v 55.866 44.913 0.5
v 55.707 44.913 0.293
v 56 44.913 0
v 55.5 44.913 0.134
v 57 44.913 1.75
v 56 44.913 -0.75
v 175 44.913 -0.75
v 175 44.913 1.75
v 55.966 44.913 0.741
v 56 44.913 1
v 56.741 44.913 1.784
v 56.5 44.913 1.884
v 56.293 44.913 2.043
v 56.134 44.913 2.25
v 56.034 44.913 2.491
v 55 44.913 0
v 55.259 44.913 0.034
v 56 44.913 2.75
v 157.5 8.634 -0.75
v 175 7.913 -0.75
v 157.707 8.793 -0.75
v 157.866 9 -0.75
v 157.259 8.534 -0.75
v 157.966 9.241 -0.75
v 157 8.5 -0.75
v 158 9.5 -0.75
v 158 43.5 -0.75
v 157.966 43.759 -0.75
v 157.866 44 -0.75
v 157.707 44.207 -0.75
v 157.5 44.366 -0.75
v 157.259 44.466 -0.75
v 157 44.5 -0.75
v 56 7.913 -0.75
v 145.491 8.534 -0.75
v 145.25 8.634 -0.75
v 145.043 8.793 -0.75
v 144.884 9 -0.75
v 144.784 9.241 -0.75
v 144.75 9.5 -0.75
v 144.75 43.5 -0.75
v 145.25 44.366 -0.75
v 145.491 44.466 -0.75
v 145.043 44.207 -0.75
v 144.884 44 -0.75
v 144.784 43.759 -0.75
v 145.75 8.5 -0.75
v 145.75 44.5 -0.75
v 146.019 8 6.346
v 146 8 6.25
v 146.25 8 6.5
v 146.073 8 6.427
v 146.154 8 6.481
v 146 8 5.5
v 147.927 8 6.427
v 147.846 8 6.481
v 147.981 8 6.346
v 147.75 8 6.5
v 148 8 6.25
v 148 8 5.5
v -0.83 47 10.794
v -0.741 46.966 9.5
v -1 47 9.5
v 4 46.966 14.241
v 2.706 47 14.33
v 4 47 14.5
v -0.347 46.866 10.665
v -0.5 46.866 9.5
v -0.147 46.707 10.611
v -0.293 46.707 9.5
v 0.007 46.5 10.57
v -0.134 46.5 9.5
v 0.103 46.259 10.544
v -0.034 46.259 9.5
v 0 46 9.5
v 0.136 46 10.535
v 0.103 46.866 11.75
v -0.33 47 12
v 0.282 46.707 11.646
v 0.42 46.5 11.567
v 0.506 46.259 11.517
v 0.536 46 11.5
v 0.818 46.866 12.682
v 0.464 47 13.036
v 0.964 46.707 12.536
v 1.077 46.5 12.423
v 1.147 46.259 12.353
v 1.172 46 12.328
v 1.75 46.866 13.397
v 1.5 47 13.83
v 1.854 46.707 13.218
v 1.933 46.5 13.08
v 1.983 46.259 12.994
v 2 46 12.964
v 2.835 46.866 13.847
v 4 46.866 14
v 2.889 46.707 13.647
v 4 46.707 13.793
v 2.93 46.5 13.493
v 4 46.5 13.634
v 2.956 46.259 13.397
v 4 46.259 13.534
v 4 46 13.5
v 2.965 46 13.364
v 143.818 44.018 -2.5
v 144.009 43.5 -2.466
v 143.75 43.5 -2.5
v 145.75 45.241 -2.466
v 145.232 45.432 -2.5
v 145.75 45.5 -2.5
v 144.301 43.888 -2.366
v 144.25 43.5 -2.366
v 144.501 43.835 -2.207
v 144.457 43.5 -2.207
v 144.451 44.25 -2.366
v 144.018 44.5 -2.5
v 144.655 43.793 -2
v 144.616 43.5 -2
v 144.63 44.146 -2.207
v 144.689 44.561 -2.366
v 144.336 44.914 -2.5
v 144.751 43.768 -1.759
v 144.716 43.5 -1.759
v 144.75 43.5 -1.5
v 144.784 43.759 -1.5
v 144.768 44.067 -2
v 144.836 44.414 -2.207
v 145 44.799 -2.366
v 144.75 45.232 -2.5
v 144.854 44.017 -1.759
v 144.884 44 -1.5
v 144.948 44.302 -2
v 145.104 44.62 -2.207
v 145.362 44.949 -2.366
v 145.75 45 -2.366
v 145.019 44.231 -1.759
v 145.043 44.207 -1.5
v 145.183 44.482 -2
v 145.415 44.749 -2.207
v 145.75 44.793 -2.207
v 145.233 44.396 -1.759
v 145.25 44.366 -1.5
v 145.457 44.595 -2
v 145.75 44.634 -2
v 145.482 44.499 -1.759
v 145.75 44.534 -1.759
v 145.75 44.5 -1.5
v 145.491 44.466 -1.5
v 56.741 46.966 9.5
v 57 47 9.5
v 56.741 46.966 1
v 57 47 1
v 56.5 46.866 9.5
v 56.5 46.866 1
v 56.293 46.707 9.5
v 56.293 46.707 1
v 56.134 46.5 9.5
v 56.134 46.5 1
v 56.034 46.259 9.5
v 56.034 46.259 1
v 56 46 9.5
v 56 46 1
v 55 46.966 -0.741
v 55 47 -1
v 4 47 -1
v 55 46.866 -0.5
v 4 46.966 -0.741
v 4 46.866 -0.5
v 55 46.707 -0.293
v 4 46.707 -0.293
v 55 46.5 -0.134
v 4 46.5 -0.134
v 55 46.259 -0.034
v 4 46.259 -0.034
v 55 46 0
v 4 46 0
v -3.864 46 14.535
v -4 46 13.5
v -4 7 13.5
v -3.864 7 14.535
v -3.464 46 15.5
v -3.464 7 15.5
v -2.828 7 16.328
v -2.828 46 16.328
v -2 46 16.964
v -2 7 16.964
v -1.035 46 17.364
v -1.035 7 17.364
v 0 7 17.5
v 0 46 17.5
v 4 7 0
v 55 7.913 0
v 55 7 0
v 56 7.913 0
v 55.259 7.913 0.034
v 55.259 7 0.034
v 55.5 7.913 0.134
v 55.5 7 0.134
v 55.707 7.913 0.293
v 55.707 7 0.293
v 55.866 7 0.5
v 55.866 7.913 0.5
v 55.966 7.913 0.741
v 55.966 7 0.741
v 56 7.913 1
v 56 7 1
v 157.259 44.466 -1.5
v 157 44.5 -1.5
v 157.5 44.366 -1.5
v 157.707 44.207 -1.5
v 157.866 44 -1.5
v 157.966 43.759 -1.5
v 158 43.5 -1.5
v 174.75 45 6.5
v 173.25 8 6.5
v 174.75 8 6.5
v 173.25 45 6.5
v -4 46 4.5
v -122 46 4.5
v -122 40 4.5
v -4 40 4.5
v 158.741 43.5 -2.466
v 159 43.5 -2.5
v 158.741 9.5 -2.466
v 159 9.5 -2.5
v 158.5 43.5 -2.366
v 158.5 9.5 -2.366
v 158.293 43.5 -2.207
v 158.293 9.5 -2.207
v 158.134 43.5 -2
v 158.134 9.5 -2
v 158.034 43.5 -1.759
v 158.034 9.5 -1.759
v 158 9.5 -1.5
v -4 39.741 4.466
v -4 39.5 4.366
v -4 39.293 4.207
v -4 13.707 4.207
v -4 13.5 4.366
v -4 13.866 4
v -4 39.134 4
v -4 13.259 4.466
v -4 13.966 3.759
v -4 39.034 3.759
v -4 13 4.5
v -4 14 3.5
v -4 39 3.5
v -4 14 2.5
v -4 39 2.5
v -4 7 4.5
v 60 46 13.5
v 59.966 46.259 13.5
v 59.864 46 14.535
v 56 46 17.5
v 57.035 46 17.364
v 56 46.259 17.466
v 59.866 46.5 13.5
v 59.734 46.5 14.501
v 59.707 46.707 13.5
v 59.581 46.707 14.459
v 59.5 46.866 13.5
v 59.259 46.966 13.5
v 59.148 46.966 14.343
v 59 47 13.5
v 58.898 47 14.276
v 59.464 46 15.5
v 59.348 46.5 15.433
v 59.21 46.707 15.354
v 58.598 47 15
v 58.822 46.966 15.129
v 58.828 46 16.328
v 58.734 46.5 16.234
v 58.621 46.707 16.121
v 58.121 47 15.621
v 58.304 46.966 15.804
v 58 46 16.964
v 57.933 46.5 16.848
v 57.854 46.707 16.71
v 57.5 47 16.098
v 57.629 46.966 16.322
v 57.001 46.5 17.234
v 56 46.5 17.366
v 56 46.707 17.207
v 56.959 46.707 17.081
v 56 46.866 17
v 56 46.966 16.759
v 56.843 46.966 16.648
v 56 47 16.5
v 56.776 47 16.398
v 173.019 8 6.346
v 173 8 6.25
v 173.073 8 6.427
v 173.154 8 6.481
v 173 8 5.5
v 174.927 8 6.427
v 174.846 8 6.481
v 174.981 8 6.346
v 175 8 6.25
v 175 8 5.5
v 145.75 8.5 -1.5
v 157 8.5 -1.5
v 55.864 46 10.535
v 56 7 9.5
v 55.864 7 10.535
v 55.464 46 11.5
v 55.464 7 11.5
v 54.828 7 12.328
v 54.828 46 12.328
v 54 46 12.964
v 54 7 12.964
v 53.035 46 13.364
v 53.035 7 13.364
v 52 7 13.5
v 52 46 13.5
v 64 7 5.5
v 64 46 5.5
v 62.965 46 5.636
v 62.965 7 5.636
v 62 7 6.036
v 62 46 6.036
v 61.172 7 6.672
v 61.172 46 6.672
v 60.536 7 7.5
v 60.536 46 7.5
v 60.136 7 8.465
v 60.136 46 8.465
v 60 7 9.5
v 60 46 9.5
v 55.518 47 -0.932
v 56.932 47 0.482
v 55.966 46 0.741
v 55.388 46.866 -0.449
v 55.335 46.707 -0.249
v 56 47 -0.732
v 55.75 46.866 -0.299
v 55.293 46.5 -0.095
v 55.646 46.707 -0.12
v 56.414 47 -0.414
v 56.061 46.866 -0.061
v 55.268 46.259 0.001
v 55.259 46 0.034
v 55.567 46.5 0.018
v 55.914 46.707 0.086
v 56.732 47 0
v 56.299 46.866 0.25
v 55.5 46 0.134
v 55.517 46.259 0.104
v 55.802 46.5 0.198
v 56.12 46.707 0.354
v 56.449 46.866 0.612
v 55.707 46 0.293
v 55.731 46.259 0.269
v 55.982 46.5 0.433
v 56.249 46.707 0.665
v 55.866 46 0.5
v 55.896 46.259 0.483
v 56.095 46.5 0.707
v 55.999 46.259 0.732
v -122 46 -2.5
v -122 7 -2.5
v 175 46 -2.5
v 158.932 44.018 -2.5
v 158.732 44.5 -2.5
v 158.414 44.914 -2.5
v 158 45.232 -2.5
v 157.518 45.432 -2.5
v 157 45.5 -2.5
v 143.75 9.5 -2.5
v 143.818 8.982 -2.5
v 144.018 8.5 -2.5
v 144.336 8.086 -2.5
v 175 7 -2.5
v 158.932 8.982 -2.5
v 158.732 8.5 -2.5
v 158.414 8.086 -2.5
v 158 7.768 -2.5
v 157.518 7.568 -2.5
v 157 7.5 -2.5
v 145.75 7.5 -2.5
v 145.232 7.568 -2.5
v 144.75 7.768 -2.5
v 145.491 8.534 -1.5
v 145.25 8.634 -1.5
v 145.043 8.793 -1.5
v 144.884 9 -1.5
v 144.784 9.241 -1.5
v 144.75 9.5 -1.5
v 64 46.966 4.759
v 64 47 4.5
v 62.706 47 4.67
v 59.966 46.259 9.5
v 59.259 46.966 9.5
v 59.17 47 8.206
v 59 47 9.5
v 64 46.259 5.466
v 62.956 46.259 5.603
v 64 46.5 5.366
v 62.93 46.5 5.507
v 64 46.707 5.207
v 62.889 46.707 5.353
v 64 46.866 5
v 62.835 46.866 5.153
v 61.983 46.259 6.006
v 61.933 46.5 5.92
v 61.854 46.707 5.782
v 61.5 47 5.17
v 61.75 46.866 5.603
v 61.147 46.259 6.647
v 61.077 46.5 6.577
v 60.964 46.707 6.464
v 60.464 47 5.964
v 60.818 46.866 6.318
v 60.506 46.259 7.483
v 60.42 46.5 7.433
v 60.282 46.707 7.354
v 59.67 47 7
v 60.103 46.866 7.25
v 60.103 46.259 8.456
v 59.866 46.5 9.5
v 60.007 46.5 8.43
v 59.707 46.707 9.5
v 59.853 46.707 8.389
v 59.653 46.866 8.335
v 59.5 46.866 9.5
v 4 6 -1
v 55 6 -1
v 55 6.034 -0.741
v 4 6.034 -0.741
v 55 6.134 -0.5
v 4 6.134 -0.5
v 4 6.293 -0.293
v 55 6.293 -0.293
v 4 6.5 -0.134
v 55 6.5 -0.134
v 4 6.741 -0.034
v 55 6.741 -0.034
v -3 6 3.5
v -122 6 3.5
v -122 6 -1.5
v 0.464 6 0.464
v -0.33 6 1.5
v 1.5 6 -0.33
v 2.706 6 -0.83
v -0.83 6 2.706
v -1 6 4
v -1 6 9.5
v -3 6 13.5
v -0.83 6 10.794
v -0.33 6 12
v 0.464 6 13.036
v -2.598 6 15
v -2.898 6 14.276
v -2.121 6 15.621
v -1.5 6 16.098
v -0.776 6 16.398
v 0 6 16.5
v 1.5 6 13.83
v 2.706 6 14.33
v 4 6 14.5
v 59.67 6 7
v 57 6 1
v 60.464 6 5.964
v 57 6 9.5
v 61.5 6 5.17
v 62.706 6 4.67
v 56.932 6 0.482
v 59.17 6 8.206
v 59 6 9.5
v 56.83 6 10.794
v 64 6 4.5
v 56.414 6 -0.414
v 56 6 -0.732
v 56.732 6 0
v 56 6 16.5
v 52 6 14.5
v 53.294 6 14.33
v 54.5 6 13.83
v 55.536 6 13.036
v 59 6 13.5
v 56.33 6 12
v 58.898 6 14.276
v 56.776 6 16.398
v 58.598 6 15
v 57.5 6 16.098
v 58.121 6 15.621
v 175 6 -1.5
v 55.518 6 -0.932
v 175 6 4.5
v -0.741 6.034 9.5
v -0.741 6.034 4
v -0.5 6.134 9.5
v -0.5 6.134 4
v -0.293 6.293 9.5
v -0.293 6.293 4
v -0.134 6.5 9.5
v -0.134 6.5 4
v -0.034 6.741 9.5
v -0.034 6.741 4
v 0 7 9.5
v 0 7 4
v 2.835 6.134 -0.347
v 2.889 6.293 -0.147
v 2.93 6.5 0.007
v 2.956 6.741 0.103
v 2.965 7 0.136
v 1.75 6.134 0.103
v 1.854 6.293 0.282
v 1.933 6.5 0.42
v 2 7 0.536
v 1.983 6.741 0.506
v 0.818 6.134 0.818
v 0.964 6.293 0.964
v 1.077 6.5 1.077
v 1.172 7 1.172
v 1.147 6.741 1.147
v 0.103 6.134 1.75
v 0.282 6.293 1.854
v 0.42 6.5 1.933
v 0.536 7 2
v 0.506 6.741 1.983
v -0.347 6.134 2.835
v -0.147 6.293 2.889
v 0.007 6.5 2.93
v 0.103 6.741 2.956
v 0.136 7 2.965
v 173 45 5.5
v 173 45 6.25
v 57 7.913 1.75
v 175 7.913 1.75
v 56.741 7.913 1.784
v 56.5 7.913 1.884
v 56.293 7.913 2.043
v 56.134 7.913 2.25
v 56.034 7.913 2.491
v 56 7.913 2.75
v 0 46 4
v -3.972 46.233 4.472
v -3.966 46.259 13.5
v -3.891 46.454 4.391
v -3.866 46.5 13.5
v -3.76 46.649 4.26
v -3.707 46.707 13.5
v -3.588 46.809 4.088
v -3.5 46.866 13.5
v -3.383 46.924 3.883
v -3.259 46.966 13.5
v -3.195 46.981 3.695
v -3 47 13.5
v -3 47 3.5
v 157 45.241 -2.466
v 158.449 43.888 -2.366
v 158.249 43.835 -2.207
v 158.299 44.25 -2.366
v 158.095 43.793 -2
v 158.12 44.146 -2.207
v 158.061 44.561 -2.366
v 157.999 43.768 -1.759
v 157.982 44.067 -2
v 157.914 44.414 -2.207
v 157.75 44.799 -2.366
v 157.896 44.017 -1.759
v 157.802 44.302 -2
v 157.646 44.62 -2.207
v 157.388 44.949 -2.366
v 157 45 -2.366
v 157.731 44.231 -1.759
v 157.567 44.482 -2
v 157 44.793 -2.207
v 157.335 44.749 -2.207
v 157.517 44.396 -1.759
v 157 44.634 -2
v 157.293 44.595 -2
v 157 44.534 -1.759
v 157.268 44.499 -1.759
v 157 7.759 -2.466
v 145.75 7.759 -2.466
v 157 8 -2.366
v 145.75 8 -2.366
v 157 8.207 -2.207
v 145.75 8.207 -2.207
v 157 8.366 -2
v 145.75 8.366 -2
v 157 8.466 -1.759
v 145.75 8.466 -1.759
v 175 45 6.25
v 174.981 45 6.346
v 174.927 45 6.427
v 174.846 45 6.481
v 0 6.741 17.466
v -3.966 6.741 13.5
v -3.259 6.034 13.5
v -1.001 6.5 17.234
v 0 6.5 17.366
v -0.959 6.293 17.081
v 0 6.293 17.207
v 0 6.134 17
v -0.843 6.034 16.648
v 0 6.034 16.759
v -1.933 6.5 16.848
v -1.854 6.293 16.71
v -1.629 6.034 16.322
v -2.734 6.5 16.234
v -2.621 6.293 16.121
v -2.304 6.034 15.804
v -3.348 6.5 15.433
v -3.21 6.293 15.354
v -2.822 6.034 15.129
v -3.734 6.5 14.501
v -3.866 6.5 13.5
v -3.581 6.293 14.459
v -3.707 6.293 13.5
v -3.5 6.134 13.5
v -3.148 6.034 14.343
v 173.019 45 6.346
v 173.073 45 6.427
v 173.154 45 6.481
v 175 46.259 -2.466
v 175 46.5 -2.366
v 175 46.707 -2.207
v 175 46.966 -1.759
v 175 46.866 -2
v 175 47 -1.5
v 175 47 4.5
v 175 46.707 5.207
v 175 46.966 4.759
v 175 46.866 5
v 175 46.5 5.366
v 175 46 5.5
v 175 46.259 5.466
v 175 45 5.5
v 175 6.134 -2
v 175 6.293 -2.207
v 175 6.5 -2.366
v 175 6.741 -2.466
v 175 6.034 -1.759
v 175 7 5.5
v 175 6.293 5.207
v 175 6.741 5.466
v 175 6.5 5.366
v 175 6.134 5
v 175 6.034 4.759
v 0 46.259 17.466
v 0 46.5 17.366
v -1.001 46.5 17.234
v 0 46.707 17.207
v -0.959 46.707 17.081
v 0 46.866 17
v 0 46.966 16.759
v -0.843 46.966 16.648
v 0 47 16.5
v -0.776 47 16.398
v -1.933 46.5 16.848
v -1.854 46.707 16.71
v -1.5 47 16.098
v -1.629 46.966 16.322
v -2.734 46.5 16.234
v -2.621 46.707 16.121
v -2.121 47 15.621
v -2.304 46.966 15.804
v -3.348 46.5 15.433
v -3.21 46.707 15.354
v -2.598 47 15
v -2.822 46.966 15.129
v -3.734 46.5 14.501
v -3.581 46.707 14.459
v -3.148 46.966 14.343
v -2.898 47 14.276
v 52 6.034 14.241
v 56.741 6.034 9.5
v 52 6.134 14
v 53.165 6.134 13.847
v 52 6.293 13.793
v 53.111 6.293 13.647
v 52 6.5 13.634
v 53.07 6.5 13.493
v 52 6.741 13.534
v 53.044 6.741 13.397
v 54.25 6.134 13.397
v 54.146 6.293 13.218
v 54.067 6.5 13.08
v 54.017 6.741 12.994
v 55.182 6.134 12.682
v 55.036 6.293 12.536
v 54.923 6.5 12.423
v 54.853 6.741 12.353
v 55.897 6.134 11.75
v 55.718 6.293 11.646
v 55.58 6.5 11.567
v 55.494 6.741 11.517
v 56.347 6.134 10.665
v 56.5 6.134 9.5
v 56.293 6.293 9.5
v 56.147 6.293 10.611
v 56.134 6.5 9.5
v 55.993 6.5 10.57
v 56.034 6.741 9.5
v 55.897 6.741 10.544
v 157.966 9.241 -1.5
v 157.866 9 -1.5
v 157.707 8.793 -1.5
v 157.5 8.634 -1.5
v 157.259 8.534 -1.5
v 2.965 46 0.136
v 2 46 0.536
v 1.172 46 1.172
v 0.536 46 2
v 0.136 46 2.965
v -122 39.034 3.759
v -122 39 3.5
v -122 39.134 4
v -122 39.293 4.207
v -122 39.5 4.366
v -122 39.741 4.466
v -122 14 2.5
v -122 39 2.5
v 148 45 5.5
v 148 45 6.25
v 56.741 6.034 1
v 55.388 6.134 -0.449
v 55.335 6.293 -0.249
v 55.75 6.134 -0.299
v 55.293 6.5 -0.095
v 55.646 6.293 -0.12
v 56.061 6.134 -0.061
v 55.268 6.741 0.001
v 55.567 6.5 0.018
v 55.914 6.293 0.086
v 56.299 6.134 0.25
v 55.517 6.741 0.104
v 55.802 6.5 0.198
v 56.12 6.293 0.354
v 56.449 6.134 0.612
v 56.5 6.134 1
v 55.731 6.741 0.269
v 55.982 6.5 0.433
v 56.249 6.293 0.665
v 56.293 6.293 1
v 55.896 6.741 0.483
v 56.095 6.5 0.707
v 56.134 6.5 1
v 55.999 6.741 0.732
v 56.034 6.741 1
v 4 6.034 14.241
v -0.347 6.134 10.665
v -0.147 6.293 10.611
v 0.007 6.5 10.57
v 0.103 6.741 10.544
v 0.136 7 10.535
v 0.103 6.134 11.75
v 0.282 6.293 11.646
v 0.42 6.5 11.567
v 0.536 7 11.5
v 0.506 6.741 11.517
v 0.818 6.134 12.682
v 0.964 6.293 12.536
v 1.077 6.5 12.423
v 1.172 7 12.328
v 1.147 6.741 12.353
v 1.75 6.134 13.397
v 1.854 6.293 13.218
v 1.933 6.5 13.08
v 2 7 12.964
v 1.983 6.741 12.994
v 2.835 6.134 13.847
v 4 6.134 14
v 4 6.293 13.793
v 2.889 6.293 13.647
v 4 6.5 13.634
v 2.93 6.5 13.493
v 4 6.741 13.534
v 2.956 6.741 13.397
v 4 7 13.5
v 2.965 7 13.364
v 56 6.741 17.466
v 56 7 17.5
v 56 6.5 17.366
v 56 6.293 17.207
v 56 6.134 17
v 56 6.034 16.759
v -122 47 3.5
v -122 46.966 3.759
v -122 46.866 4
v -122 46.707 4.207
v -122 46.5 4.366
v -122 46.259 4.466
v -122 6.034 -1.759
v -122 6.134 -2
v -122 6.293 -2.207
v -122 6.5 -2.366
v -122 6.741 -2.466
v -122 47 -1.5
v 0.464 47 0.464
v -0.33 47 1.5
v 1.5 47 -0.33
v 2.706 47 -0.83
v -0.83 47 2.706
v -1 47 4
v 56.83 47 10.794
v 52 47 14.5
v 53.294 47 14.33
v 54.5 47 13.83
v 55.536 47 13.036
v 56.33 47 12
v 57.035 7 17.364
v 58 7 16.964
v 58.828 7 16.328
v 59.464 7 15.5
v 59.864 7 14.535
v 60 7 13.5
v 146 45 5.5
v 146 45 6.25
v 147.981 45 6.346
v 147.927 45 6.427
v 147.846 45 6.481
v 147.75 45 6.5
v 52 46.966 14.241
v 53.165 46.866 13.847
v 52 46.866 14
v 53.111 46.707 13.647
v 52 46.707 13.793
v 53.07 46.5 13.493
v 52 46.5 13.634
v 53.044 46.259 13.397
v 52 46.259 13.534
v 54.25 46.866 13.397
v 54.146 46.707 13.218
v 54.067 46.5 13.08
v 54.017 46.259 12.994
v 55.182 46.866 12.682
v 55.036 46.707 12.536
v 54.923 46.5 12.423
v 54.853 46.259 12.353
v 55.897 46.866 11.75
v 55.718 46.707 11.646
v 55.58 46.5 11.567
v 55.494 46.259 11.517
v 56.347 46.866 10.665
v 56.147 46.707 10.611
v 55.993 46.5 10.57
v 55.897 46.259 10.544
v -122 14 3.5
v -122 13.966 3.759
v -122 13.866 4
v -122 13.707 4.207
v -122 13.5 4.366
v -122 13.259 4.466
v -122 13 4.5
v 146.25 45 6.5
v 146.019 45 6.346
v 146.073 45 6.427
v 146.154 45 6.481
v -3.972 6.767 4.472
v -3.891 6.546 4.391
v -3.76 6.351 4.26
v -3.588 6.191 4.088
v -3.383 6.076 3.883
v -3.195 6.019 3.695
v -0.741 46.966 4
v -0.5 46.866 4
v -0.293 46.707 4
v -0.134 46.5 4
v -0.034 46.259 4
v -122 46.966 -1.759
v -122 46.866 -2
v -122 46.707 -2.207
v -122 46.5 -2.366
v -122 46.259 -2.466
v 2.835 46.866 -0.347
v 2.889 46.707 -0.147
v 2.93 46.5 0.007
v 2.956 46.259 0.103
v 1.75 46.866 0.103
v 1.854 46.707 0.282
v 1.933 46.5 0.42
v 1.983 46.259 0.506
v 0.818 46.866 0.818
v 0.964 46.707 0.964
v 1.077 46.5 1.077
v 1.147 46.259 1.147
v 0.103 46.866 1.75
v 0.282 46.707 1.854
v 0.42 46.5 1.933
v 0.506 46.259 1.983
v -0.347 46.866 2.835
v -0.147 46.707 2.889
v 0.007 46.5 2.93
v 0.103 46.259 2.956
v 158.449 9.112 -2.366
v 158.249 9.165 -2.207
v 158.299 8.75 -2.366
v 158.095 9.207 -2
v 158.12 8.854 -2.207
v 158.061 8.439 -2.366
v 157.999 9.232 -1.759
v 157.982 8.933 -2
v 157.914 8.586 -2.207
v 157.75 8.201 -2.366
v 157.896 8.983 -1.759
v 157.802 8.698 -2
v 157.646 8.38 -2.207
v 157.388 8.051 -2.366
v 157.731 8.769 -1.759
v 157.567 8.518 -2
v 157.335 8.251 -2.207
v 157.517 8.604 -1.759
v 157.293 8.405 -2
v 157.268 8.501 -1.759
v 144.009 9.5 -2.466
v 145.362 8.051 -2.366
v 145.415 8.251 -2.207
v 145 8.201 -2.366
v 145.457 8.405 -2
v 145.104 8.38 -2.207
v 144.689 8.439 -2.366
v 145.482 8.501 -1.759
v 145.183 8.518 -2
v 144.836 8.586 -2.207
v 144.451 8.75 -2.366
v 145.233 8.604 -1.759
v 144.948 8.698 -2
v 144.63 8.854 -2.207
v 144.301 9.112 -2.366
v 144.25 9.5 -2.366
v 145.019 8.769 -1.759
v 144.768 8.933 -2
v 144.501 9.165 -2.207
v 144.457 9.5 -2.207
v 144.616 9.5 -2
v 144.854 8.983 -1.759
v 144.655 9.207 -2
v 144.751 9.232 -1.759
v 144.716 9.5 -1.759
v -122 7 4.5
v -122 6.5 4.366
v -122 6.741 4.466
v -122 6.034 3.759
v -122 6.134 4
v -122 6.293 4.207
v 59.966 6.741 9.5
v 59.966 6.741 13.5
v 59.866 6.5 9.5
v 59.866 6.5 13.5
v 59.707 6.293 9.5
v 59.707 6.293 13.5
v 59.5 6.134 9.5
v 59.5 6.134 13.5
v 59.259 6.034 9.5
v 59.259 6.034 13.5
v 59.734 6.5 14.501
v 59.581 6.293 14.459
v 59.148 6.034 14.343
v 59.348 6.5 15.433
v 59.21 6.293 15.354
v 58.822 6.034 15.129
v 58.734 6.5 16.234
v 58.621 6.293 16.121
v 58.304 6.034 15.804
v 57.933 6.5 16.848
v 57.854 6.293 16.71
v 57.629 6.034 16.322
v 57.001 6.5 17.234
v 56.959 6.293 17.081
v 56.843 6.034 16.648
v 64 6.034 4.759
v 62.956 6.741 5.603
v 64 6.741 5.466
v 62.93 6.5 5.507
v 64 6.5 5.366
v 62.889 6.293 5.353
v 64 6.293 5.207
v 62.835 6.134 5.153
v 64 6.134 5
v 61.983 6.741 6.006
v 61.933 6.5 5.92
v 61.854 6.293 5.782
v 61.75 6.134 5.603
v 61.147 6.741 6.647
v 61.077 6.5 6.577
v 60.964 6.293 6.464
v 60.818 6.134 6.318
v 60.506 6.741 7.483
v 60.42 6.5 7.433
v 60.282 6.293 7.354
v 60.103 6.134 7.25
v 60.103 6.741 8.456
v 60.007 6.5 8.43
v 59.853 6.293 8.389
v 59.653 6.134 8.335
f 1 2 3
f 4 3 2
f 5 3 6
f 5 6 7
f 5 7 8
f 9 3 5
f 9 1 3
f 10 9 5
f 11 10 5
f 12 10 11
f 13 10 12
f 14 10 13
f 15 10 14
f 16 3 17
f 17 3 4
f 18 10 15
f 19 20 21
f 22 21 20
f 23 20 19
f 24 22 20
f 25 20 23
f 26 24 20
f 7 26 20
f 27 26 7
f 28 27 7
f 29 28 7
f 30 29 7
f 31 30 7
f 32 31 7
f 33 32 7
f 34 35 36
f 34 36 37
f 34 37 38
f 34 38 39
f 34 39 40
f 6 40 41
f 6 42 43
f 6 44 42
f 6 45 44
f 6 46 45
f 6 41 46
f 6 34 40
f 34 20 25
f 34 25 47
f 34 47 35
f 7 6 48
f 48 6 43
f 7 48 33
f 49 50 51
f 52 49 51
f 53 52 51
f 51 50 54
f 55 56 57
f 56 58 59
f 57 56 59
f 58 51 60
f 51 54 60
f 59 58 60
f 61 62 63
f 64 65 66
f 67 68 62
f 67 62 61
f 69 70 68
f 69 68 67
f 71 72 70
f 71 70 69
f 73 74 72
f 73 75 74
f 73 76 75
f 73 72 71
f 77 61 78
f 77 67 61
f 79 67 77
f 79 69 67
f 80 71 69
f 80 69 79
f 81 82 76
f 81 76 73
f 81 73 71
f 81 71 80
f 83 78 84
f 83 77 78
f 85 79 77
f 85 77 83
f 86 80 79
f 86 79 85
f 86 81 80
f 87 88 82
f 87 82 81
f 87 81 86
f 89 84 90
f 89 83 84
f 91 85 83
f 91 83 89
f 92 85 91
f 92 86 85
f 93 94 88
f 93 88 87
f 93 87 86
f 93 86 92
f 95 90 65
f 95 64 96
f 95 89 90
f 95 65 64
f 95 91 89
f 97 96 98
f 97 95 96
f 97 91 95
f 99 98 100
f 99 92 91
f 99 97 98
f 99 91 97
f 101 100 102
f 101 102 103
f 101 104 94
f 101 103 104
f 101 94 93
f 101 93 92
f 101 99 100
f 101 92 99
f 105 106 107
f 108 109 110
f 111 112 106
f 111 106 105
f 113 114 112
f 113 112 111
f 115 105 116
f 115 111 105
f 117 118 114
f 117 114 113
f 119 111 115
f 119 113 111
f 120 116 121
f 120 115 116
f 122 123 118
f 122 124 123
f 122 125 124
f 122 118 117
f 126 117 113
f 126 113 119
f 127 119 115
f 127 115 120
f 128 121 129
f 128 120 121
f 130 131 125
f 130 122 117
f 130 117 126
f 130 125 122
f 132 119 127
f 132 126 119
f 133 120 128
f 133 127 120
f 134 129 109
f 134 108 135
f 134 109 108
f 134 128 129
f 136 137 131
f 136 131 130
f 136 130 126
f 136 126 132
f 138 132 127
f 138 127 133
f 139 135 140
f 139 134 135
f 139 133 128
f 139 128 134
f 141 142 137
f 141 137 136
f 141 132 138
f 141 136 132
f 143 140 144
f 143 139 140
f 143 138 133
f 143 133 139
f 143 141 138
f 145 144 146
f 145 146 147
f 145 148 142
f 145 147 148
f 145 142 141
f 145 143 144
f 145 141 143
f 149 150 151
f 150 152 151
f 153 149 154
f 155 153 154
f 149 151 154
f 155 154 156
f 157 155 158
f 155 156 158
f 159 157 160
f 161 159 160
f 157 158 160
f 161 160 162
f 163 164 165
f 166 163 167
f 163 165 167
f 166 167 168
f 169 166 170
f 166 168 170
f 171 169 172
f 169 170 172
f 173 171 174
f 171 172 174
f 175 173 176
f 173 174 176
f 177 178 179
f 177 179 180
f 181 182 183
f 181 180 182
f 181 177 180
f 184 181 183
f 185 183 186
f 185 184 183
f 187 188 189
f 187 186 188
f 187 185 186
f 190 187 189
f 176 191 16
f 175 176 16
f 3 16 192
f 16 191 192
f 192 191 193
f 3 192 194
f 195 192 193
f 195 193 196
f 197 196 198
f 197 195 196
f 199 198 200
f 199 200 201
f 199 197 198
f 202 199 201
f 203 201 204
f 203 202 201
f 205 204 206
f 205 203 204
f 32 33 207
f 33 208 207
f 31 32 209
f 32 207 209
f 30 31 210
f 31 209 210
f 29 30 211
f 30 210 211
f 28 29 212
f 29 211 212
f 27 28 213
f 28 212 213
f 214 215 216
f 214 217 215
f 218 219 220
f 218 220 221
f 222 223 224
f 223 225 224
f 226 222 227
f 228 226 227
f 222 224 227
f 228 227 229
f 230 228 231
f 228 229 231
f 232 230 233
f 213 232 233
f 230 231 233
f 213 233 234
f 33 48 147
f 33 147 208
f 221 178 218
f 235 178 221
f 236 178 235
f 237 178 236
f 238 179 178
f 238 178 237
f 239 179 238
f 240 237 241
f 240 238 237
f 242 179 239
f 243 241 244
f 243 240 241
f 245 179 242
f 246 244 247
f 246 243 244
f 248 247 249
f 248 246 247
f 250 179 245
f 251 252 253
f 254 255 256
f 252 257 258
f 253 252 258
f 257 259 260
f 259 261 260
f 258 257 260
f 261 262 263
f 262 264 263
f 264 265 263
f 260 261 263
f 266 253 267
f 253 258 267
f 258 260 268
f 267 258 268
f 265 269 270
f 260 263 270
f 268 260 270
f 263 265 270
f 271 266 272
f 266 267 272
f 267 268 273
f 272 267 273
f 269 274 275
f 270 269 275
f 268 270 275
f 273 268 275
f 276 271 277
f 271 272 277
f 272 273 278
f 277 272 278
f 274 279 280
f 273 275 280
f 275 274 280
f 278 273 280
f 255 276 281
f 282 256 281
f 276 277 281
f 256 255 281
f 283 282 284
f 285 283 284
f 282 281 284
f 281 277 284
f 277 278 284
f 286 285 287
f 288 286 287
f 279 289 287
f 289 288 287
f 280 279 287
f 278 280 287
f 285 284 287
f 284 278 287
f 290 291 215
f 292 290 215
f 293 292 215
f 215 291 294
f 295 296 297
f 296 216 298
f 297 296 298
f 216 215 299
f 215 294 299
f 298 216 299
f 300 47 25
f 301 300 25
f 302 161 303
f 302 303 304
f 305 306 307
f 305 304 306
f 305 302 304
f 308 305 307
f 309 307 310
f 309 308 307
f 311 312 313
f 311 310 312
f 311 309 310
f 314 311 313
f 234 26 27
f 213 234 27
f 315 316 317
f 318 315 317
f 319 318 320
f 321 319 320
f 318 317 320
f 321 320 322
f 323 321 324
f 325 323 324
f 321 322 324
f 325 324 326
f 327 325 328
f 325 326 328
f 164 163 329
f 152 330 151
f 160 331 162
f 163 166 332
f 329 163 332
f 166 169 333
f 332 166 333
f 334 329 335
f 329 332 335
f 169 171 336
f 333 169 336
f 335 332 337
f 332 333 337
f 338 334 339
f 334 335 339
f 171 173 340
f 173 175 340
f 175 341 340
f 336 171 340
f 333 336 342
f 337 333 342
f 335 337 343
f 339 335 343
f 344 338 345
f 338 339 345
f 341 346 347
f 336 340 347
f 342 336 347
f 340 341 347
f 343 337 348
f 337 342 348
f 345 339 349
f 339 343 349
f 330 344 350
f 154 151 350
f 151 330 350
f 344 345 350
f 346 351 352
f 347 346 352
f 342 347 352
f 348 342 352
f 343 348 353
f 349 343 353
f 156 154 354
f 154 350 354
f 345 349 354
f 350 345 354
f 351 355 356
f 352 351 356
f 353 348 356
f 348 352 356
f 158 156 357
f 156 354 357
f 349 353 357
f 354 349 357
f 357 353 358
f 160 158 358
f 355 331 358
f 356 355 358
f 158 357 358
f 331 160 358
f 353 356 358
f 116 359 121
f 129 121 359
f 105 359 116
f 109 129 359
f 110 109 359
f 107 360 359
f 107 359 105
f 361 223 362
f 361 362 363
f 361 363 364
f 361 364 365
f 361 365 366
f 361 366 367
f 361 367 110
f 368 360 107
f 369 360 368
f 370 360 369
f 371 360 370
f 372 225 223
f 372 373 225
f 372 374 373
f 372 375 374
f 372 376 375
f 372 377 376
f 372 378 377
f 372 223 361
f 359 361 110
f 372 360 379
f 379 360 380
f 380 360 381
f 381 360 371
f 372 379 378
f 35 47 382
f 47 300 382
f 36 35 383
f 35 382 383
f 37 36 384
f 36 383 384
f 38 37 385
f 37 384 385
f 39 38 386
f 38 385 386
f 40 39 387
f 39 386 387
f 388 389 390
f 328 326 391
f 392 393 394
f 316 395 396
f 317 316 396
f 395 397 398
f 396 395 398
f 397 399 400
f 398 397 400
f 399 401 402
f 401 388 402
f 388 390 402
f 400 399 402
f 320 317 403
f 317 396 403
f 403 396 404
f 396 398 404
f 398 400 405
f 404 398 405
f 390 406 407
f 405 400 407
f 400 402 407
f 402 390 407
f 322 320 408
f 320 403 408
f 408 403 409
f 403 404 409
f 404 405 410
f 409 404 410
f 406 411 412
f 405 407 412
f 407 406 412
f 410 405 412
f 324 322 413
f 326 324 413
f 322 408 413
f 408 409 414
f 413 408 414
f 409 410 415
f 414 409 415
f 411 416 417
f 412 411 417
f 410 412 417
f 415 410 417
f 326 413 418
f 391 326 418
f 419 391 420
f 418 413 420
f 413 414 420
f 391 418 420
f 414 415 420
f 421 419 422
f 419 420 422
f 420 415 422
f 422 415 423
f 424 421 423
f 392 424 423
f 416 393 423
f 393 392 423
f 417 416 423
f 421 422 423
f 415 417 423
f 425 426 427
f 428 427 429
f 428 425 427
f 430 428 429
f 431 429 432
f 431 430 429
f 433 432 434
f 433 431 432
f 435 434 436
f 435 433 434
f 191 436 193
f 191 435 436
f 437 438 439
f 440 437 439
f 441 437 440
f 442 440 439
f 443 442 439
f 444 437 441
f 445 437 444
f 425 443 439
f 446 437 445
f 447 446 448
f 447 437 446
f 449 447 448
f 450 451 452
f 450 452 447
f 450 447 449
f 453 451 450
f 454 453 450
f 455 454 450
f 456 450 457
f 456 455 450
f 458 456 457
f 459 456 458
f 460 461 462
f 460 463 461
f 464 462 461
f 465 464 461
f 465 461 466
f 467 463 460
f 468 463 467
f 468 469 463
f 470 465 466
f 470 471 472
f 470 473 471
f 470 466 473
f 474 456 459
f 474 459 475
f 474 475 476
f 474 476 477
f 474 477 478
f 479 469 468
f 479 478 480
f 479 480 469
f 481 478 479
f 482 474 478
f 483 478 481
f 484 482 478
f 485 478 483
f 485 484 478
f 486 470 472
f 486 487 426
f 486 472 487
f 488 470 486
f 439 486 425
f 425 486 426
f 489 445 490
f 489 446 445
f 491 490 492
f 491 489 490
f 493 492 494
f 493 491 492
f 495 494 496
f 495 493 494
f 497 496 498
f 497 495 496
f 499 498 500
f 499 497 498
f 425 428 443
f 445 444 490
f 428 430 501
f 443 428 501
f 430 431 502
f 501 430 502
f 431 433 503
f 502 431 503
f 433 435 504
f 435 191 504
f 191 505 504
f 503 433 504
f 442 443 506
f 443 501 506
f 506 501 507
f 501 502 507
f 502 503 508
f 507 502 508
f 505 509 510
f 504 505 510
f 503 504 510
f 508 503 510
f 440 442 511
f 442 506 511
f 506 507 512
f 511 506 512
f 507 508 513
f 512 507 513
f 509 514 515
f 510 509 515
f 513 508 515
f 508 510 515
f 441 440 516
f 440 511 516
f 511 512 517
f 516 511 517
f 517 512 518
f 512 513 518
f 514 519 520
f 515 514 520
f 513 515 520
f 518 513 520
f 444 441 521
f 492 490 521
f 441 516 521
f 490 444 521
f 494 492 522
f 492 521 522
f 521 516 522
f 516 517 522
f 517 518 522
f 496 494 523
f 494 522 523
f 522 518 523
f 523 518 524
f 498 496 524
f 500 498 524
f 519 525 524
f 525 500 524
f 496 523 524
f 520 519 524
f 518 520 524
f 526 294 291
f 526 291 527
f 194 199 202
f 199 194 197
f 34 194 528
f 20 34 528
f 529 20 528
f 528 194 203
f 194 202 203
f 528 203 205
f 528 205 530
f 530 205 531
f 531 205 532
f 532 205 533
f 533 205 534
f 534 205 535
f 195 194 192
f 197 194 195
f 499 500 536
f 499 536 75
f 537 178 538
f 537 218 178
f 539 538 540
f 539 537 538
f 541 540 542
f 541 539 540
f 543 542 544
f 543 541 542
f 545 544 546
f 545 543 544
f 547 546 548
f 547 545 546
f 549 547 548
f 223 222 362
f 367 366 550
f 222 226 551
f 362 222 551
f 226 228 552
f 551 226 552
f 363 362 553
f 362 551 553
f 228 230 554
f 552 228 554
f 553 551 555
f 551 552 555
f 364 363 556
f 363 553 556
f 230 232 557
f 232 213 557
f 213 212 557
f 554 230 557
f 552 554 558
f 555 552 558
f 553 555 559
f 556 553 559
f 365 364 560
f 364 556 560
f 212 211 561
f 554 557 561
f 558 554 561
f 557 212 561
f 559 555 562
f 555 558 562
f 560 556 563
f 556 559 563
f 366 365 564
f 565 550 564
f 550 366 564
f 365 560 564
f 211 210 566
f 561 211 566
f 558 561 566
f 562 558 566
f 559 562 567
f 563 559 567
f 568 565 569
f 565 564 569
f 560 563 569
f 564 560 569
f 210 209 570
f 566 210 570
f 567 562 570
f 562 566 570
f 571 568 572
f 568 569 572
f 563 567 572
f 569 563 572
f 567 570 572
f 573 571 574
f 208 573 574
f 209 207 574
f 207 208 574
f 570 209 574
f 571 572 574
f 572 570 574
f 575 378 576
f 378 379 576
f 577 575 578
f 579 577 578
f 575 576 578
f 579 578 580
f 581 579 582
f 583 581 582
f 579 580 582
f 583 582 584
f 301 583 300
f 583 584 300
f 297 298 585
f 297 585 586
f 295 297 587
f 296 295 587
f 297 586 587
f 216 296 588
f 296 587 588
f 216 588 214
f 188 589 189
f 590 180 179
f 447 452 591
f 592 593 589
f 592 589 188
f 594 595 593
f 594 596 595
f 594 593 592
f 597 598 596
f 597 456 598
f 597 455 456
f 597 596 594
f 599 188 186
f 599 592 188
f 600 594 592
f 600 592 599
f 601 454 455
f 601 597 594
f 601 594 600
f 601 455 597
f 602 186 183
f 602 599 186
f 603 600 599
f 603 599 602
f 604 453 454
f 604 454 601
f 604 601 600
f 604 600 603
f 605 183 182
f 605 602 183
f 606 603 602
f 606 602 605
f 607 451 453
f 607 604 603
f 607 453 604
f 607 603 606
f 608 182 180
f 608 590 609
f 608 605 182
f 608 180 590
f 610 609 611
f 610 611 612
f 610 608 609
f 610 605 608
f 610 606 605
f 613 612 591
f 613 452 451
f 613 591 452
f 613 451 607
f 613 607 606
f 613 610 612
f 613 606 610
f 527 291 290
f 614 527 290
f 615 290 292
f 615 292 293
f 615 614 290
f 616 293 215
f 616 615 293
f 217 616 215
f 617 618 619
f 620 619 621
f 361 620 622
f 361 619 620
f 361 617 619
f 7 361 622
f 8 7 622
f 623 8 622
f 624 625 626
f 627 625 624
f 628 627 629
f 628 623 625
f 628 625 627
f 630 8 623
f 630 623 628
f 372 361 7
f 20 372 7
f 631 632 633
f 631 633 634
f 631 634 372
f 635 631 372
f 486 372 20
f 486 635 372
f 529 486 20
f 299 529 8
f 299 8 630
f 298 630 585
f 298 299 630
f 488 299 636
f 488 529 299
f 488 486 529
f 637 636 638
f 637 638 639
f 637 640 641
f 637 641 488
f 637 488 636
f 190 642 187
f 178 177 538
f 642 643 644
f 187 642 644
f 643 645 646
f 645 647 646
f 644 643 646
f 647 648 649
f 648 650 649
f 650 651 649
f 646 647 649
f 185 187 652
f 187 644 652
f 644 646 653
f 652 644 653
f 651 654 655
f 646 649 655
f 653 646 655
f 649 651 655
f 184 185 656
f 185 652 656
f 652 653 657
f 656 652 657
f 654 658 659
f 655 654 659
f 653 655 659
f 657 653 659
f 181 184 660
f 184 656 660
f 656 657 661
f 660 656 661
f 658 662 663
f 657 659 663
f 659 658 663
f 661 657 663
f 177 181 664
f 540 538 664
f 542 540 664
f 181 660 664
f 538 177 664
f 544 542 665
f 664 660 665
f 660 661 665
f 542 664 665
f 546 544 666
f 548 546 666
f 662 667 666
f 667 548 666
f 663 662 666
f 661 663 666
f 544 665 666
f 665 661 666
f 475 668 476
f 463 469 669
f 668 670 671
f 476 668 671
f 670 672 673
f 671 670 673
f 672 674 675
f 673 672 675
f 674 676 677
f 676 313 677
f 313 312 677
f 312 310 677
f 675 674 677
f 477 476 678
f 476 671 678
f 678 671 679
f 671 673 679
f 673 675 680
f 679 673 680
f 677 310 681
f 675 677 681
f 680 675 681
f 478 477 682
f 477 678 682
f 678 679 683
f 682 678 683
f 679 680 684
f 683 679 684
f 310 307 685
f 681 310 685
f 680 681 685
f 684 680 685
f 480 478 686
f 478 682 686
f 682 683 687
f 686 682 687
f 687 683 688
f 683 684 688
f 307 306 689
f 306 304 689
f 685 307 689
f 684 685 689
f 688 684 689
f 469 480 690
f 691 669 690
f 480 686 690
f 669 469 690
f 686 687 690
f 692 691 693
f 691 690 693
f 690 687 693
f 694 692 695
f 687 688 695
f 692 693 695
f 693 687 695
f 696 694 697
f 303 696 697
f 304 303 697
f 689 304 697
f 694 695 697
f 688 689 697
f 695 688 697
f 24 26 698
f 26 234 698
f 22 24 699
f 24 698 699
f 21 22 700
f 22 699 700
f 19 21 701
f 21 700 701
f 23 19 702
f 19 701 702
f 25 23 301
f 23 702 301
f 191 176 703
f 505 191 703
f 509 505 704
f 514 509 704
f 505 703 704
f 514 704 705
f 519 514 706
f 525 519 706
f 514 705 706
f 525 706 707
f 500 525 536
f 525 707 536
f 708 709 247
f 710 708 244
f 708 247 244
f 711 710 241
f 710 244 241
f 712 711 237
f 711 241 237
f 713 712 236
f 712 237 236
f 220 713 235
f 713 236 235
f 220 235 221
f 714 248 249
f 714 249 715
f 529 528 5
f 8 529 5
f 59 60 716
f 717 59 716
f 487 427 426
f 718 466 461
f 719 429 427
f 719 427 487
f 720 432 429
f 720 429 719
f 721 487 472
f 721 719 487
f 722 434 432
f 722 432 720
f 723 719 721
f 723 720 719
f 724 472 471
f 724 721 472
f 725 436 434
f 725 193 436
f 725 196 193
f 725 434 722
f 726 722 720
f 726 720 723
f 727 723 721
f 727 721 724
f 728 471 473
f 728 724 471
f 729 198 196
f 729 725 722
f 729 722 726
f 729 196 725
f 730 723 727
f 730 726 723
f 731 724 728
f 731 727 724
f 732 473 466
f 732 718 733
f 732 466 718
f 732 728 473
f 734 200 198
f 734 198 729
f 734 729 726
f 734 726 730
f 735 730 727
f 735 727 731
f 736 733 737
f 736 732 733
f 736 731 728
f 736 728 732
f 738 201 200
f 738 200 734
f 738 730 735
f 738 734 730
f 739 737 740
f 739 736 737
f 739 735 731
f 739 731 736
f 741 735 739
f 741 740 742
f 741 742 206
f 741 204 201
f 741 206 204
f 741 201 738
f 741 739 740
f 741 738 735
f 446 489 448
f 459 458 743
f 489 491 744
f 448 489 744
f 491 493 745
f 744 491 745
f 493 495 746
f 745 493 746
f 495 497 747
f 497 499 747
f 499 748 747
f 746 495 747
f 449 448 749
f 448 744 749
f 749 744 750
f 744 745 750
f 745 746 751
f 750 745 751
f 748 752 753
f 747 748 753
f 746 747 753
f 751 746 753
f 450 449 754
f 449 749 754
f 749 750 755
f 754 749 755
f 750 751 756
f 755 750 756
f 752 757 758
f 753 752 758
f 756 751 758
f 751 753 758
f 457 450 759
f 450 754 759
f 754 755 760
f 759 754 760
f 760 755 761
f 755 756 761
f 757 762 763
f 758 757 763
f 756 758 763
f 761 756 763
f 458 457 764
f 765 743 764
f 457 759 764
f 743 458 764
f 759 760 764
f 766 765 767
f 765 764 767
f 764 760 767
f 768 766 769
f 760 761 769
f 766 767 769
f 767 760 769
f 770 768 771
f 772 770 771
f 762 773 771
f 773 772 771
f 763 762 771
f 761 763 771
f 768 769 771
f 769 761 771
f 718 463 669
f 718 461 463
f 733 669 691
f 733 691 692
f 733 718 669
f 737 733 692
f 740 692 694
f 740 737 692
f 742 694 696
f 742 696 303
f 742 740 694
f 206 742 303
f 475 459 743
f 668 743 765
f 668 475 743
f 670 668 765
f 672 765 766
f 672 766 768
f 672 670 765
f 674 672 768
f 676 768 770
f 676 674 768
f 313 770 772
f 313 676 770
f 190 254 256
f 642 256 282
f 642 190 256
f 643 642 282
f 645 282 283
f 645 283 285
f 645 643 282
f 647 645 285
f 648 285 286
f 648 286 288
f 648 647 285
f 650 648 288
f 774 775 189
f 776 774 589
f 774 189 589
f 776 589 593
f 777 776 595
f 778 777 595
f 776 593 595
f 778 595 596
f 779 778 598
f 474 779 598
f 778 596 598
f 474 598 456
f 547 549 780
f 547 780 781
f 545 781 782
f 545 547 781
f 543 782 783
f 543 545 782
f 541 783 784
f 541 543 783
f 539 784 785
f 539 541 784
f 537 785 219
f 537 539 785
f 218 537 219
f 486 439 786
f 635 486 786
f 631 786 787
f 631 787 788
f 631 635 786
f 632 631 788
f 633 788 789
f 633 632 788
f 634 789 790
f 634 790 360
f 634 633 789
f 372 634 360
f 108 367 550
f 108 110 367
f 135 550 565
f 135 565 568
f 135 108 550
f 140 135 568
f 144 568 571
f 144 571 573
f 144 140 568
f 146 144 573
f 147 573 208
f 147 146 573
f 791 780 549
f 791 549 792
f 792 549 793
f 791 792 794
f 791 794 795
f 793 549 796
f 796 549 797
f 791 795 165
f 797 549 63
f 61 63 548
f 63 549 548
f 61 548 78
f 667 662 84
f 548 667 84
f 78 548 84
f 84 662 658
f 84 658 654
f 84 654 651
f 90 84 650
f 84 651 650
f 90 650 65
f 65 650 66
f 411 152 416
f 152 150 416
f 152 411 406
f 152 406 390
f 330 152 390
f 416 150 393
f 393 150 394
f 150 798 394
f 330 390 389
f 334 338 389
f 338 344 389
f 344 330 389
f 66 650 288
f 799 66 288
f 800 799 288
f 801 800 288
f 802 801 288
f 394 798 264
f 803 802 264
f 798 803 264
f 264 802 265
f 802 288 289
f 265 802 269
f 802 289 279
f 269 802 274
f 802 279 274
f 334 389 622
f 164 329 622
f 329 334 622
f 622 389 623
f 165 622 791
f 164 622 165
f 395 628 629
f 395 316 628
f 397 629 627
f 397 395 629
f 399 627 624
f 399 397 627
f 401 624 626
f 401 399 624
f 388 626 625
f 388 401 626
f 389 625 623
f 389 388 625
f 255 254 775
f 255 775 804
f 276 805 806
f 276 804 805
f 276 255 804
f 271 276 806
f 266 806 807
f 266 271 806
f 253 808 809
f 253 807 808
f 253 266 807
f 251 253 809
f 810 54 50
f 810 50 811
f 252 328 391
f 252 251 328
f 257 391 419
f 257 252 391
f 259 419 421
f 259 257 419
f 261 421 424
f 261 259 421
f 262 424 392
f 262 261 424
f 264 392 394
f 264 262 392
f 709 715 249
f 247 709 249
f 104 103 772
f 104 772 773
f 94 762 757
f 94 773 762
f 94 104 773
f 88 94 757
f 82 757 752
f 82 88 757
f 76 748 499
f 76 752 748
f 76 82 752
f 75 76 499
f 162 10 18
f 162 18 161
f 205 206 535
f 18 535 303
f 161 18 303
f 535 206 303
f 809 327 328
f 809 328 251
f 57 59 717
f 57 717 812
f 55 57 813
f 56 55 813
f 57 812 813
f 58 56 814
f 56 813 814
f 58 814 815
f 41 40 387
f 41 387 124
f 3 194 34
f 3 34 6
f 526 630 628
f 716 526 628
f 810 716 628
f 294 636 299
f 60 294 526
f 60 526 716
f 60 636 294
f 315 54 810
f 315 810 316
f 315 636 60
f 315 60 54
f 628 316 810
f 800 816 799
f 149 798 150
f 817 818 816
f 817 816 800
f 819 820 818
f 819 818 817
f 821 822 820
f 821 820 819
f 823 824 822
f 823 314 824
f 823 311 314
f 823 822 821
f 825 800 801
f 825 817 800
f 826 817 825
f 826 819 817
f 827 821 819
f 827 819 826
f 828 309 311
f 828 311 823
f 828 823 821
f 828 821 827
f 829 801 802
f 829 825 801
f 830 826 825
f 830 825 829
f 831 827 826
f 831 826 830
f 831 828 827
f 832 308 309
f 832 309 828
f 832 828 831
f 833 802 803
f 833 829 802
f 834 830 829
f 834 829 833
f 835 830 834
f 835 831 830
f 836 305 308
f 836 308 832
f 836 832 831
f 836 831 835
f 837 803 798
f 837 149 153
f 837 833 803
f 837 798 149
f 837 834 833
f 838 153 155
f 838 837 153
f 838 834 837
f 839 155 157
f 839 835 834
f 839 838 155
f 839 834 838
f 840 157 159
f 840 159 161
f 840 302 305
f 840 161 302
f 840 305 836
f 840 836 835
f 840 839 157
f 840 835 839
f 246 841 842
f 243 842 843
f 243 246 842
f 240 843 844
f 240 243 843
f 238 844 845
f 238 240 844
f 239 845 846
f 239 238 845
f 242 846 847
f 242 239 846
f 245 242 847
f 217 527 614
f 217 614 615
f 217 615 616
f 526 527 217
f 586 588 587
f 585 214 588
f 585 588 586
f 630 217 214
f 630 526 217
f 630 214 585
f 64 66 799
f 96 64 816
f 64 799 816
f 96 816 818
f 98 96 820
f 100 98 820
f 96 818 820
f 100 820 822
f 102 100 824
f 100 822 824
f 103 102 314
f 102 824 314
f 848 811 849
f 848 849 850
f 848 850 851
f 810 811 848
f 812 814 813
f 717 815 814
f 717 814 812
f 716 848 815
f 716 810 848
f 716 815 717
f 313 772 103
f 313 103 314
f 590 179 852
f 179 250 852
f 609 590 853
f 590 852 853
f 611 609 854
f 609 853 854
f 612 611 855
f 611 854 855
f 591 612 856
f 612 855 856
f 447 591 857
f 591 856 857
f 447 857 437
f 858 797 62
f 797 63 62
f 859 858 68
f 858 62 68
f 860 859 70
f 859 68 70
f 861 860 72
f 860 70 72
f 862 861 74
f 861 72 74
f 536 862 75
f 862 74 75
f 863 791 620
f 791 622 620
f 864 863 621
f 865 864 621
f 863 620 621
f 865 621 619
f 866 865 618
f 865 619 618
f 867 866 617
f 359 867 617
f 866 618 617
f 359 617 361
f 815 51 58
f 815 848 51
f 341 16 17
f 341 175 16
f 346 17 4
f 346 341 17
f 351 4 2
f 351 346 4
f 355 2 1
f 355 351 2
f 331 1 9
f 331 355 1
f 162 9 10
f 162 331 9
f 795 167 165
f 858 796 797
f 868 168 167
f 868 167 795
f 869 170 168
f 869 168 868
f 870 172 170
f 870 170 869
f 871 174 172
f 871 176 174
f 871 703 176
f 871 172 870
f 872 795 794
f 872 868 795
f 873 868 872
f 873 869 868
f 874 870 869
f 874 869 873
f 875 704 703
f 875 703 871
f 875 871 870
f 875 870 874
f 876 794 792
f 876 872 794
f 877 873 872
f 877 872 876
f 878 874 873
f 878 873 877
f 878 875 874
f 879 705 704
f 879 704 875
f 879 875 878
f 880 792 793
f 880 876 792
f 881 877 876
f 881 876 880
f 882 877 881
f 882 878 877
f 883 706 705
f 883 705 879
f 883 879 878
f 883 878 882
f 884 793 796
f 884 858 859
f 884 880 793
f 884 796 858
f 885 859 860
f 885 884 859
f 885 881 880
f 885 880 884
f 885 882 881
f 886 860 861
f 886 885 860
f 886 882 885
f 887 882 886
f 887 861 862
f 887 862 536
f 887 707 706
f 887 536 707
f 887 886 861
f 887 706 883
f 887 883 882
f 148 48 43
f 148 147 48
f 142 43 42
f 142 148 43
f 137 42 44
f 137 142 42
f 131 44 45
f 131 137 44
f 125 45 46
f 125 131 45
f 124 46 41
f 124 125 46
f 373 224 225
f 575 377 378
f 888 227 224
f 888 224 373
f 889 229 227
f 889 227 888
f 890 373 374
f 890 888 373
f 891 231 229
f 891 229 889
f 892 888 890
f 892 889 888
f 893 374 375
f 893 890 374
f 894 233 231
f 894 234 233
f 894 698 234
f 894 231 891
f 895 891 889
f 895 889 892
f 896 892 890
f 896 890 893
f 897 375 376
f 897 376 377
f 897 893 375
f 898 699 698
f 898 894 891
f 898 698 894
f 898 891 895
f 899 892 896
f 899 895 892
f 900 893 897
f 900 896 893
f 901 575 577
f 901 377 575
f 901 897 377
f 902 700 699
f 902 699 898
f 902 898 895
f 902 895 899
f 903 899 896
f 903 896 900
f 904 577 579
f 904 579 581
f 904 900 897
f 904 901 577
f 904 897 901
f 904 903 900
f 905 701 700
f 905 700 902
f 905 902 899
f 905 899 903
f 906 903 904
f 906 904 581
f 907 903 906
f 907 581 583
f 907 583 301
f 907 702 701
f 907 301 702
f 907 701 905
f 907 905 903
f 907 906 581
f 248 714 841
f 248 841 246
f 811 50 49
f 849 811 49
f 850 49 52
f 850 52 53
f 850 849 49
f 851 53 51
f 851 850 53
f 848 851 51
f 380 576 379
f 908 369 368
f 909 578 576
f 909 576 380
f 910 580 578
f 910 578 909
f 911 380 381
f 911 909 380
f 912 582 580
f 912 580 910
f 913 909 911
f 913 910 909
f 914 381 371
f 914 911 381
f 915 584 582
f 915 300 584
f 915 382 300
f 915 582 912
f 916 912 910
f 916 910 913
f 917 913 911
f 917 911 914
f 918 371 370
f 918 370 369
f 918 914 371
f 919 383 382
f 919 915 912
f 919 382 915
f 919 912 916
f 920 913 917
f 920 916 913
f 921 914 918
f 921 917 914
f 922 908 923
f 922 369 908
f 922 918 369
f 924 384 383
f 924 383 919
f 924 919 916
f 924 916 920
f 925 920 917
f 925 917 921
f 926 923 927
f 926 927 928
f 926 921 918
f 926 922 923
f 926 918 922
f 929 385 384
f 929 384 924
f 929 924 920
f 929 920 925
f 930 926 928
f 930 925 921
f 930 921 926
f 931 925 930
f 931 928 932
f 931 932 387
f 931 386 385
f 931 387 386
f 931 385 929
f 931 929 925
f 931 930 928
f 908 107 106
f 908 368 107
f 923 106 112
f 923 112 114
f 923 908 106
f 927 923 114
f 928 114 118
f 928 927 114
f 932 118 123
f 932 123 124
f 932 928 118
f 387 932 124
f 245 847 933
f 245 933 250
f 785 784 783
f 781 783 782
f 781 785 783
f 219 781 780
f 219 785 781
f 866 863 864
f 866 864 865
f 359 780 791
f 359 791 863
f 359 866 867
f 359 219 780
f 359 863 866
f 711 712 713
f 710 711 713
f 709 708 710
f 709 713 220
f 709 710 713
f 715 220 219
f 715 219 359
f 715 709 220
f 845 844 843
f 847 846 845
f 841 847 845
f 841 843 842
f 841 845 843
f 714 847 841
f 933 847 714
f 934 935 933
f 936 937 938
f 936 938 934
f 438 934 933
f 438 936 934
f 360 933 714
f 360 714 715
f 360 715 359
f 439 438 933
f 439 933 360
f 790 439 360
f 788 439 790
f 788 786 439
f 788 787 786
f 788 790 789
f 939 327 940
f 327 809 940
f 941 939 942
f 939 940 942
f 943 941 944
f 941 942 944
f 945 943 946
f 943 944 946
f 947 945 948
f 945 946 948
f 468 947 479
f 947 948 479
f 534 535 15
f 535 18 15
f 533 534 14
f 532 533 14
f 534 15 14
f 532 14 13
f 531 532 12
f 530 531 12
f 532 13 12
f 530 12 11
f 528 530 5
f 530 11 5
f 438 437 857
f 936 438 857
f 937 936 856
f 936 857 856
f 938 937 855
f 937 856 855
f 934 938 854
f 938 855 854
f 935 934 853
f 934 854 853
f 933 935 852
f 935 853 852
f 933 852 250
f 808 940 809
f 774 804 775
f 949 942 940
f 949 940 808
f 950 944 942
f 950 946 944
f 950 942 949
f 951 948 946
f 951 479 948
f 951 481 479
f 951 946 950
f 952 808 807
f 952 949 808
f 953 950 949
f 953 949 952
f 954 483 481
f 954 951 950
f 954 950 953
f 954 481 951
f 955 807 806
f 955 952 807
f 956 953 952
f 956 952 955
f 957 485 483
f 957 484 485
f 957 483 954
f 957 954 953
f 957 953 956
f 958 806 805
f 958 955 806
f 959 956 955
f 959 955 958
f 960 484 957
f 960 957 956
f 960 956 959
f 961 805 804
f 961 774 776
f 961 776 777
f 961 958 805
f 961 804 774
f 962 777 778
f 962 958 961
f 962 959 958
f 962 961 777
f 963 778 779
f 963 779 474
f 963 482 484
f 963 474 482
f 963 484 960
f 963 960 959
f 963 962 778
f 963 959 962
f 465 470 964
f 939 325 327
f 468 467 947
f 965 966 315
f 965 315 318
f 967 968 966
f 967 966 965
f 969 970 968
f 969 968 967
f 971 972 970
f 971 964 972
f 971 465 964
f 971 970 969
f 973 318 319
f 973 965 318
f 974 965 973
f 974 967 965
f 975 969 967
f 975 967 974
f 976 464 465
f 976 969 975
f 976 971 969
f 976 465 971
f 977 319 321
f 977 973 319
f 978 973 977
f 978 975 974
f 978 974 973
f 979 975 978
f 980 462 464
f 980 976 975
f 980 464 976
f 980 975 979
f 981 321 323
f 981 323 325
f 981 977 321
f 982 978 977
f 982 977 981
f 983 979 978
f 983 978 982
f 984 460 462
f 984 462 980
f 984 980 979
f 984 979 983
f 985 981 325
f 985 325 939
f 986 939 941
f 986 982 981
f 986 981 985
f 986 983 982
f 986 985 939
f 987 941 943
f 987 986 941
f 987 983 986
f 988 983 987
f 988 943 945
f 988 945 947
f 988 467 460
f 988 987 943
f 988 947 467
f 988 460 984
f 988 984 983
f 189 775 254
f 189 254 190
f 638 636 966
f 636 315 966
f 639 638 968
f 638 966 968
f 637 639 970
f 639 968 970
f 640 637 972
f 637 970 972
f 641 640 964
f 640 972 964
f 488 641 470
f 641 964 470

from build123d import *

# Parameters (mm, degrees)
SKETCH037_W      = 2
SKETCH037_H      = 37
EXTRUDE036_DEPTH = 1
FILLET012_R      = 0.25
SKETCH038_W      = 13.25
SKETCH038_H      = 36
EXTRUDE037_DEPTH = 2
SKETCH031_W      = 37
SKETCH031_H      = 2.5
EXTRUDE029_DEPTH = 120
SKETCH030_W      = 56
SKETCH030_H      = 13.5
EXTRUDE028_DEPTH = 41
SKETCH036_W      = 120
SKETCH036_H      = 8
EXTRUDE035_DEPTH = 2
FILLET011_R      = 1
FILLET013_R      = 4
FILLET014_R      = 1


with BuildPart() as velcrobands:
    # Sketch037 → Extrude036 (new body)
    with BuildSketch(Plane.XY.offset(5.5)):
        with Locations((174, 26.5)):
            Rectangle(SKETCH037_W, SKETCH037_H)
        with Locations((147, 26.5)):
            Rectangle(SKETCH037_W, SKETCH037_H)
    extrude(amount=EXTRUDE036_DEPTH)

    # Fillet012
    fillet012_edges = [velcrobands.edges().sort_by_distance(p)[0] for p in [
        (148, 26.5, 6.5),
        (146, 26.5, 6.5),
        (173, 26.5, 6.5),
        (175, 26.5, 6.5),
    ]]
    fillet(fillet012_edges, radius=FILLET012_R)


with BuildPart() as sensorcuts:
    # Sketch038 → Extrude037 (new body)
    with BuildSketch(Plane.XY.offset(-0.75)):
        with Locations((151.375, 26.5)):
            Rectangle(SKETCH038_W, SKETCH038_H)
    extrude(amount=-EXTRUDE037_DEPTH)


with BuildPart() as extrude029:
    # Sketch031 → Extrude029 (new body)
    with BuildSketch(Plane.YZ.offset(56)):
        with Locations((26.412533, 0.5)):
            Rectangle(SKETCH031_W, SKETCH031_H)
    extrude(amount=EXTRUDE029_DEPTH)


with BuildPart() as band002:
    # Sketch030 → Extrude028 (new body)
    with BuildSketch(Plane.XZ.offset(-6)):
        Polygon((175, 5.5), (60, 5.5), (60, 17.5), (-4, 17.5), (-4, 2.5), (-122, 2.5), (-122, -2.5), (175, -2.5), align=None)
        with Locations((28, 6.75)):
            Rectangle(SKETCH030_W, SKETCH030_H, mode=Mode.SUBTRACT)
    extrude(amount=-EXTRUDE028_DEPTH)

    # Cut002: cut Extrude029
    add(extrude029.part, mode=Mode.SUBTRACT)

    # Cut005: cut sensorCuts
    add(sensorcuts.part, mode=Mode.SUBTRACT)


with BuildPart() as fillet014:
    # Sketch036 → Extrude035 (new body)
    with BuildSketch(Plane.XY.offset(2.5)):
        with Locations((-62, 43)):
            Rectangle(SKETCH036_W, SKETCH036_H)
        with Locations((-62, 10)):
            Rectangle(SKETCH036_W, SKETCH036_H)
    extrude(amount=EXTRUDE035_DEPTH)

    # Fillet011
    fillet011_edges = [fillet014.edges().sort_by_distance(p)[0] for p in [
        (-62, 14, 4.5),
        (-62, 6, 4.5),
        (-62, 47, 4.5),
        (-62, 39, 4.5),
    ]]
    fillet(fillet011_edges, radius=FILLET011_R)

    # Fusion011: union velcroBands, band002
    add(velcrobands.part)
    add(band002.part)

    # Fillet013
    fillet013_edges = [fillet014.edges().sort_by_distance(p)[0] for p in [
        (60, 26.5, 5.5),
        (60, 26.5, 17.5),
        (-4, 26.5, 17.5),
        (0, 26.5, 0),
        (0, 26.5, 13.5),
        (56, 26.5, 13.5),
    ]]
    fillet(fillet013_edges, radius=FILLET013_R)

    # Fillet014
    fillet014_edges = [fillet014.edges().sort_by_distance(p)[0] for p in [
        (119.5, 6, 5.5),
        (26.5, 6, -2.5),
        (28, 6, 17.5),
        (28, 6, 13.5),
        (119.5, 47, 5.5),
        (26.5, 47, -2.5),
        (158, 26.5, -2.5),
        (151.375, 8.5, -2.5),
        (144.75, 26.5, -2.5),
        (151.375, 44.5, -2.5),
        (28, 47, 17.5),
        (56, 6.956266, 0),
        (56, 45.956266, 0),
        (28, 47, 13.5),
        (56, 26.412533, 1.75),
        (158, 8.5, -1.625),
        (158, 44.5, -1.625),
        (144.75, 8.5, -1.625),
        (144.75, 44.5, -1.625),
    ]]
    fillet(fillet014_edges, radius=FILLET014_R)


solid = fillet014.part
